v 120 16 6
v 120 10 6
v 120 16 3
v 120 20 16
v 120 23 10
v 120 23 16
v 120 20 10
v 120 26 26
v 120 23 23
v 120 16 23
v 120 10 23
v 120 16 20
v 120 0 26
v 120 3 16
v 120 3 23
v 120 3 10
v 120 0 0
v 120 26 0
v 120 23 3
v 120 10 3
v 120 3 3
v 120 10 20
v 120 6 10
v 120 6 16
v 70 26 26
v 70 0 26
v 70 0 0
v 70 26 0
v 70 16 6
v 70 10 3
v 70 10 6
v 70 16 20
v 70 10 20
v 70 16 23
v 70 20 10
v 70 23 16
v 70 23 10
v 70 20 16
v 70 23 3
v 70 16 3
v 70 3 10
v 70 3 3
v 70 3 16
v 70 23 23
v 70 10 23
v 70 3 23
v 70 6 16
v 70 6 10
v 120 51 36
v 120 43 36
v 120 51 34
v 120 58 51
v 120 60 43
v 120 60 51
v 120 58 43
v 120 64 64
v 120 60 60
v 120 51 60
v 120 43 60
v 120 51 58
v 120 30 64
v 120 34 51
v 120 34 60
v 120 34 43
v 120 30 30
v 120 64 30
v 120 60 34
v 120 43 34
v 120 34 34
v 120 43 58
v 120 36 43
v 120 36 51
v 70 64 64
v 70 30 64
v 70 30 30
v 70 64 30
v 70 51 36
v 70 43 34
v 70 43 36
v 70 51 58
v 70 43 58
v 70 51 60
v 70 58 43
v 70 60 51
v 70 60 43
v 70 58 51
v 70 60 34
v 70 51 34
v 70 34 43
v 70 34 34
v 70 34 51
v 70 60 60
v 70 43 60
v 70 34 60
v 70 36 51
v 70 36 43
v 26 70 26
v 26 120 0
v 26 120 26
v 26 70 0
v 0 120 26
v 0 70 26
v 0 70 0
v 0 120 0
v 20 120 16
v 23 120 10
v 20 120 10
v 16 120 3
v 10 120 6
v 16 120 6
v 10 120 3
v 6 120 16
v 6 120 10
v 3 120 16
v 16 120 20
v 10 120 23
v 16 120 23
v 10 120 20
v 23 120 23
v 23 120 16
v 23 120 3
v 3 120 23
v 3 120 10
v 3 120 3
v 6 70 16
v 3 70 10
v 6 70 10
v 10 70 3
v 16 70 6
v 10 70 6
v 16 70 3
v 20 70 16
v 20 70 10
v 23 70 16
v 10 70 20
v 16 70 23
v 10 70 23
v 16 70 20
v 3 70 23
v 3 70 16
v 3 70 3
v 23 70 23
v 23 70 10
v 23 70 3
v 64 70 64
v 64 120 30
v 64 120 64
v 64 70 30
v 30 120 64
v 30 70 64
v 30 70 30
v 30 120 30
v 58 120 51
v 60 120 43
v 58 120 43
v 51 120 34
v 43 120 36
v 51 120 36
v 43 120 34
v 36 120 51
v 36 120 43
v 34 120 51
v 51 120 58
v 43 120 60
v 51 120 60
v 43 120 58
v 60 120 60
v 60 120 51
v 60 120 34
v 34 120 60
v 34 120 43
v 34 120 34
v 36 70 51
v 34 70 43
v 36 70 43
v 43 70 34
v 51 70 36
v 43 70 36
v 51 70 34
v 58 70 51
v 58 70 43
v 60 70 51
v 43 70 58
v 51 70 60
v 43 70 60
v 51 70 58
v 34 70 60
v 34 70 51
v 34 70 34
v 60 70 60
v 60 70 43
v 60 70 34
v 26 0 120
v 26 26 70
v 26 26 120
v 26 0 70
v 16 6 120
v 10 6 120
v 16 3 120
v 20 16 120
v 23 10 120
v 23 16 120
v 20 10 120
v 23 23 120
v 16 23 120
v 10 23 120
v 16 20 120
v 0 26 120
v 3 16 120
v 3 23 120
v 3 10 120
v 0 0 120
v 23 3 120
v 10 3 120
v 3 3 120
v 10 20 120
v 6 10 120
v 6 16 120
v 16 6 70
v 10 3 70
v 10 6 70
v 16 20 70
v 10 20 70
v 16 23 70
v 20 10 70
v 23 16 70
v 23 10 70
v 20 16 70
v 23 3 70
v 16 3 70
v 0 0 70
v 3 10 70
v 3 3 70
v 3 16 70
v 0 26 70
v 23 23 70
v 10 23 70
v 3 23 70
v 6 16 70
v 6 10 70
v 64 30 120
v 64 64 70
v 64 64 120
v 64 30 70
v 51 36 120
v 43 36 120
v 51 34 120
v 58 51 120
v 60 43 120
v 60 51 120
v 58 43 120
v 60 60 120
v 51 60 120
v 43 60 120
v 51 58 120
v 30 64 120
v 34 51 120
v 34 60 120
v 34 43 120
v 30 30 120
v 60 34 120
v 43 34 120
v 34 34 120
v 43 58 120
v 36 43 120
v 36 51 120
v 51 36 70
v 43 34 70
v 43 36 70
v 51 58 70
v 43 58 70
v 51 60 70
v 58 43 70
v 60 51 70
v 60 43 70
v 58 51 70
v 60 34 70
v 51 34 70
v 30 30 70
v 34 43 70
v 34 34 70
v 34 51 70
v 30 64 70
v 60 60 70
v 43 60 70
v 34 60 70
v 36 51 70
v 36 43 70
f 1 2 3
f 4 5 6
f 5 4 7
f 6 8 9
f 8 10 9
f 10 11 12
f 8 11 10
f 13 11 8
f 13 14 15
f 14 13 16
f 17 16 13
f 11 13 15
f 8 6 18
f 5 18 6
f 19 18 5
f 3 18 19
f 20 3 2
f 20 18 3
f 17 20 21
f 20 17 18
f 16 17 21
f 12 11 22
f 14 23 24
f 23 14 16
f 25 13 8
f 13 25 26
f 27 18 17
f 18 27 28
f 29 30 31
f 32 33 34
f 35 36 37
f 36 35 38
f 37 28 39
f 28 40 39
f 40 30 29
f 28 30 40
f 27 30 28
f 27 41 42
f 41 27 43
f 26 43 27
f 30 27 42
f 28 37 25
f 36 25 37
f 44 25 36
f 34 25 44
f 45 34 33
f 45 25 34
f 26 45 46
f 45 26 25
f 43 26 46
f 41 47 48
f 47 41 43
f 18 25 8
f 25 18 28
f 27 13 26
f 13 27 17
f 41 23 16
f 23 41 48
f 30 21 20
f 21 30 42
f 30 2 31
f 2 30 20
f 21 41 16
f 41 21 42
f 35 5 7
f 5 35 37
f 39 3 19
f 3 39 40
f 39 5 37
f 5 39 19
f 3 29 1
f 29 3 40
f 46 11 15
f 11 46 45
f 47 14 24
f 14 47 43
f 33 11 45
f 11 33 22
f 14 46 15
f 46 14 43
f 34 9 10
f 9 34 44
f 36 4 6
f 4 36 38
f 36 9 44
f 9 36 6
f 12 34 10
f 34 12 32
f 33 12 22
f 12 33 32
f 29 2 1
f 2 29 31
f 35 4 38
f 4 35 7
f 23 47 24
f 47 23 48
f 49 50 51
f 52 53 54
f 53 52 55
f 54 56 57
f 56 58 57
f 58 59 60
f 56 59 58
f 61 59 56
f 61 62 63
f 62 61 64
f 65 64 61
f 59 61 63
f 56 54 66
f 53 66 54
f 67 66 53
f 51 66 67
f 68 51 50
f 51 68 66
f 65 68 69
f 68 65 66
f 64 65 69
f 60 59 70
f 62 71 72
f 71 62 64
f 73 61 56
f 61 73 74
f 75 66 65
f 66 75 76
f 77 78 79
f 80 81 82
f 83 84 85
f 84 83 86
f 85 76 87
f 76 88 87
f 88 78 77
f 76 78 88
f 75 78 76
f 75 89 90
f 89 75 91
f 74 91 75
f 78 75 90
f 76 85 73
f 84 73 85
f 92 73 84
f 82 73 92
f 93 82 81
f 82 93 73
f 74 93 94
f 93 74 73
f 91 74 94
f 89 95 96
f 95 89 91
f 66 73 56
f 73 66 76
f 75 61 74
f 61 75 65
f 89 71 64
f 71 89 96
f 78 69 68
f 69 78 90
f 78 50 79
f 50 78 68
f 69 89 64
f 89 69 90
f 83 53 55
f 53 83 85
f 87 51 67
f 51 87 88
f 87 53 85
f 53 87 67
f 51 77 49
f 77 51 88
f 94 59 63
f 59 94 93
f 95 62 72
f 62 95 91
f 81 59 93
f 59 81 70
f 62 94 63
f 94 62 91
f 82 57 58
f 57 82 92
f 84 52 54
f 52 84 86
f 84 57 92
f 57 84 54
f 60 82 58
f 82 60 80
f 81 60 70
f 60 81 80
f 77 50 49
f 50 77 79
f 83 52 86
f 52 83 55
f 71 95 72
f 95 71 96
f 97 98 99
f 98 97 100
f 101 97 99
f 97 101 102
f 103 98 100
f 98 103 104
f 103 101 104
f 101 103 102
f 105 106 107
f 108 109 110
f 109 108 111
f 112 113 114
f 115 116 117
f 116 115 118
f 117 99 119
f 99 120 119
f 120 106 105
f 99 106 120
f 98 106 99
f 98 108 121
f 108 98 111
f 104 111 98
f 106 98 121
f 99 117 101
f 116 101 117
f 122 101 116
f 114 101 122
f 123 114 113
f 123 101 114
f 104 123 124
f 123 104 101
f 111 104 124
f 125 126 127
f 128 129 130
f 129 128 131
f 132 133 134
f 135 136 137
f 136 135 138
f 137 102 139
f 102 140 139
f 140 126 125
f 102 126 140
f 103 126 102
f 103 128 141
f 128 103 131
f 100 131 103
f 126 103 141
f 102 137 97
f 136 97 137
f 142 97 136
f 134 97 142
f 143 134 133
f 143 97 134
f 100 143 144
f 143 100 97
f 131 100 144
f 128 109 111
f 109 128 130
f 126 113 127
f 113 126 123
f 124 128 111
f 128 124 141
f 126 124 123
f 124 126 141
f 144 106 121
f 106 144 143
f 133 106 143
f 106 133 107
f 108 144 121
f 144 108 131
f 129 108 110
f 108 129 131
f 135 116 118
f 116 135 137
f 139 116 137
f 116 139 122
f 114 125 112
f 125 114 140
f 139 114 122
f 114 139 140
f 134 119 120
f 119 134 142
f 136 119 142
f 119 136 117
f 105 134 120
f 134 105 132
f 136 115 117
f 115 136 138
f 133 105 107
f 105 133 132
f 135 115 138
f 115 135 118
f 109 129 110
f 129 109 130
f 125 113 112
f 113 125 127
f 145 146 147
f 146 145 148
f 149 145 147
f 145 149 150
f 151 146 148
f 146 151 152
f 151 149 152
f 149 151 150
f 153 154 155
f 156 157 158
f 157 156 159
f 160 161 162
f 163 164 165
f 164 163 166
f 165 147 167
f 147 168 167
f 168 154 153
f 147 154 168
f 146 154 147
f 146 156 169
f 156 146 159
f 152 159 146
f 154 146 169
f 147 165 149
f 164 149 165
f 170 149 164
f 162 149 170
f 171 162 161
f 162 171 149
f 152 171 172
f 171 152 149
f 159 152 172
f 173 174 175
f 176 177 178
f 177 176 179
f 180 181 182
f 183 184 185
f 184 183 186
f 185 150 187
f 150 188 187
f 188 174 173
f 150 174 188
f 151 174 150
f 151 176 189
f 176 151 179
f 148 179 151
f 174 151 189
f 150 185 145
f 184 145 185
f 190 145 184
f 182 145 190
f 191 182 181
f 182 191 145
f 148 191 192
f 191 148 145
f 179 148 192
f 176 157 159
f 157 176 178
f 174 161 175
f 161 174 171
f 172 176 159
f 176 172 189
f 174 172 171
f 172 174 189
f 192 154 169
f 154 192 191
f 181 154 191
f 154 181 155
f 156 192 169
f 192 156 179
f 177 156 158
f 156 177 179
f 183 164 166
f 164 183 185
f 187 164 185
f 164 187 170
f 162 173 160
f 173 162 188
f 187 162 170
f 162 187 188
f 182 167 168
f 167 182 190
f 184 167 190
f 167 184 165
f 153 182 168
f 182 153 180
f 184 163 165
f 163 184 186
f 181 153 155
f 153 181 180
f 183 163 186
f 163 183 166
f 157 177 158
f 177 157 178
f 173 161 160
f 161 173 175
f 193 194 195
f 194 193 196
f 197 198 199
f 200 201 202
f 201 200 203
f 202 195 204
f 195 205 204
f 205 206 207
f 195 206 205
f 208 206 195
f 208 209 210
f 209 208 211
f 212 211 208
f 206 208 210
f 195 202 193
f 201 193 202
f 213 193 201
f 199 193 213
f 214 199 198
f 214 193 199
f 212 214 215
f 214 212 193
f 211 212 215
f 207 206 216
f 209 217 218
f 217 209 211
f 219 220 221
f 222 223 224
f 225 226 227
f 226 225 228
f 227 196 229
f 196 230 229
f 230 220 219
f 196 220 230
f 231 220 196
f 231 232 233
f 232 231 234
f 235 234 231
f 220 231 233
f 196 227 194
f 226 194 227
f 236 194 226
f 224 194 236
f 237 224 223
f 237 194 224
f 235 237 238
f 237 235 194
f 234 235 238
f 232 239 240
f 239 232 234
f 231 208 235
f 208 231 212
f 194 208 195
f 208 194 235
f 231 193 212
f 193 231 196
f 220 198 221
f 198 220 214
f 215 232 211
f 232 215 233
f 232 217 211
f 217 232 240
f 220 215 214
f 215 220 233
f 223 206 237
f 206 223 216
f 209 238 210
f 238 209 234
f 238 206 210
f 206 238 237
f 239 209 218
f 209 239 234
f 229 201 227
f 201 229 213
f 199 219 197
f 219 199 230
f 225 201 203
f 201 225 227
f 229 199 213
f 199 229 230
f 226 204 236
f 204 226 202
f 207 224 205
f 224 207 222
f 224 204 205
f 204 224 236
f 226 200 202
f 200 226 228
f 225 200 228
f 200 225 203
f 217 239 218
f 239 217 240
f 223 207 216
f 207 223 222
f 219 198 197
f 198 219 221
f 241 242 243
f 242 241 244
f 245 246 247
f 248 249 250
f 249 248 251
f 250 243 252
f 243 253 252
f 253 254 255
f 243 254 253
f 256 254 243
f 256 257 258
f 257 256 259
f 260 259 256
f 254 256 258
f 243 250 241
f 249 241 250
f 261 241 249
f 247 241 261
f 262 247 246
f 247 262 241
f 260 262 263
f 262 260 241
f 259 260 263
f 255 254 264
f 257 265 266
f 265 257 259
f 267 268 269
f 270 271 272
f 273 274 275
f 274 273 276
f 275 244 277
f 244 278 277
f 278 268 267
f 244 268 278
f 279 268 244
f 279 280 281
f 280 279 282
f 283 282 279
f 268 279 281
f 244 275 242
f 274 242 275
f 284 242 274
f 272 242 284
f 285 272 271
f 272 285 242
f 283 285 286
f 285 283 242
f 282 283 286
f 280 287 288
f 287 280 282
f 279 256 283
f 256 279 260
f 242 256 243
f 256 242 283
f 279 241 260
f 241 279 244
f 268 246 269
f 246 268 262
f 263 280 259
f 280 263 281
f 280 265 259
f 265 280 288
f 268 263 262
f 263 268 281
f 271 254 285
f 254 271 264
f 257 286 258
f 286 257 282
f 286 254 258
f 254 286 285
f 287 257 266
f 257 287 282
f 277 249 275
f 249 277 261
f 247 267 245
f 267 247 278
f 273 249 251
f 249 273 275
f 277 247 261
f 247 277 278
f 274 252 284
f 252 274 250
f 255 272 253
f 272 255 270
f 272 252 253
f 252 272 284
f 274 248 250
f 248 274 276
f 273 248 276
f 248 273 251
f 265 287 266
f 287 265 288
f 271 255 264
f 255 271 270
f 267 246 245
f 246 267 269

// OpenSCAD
// file: modules_coin_0_1.scad
module tube_profile_X(x, y, z, longueur, epaisseur = 3, epaisseur_bloc = 3, largeur_bloc = 6, largeur_profile = 20)
{
    ecart = (largeur_profile - largeur_bloc)/2;
    
    difference()
    {
        translate([x,y,z])
        cube([longueur, largeur_profile+2*epaisseur, largeur_profile+2*epaisseur]);
        
        translate([x-1,y+epaisseur,z+epaisseur])
        #cube([longueur+2,ecart,ecart]);
        
        translate([x-1,y+epaisseur+ecart+largeur_bloc,z+epaisseur])
        #cube([longueur+2,ecart,ecart]);
        
        translate([x-1,y+epaisseur,z+epaisseur+ecart+largeur_bloc])
        #cube([longueur+2,ecart,ecart]);
        
        translate([x-1,y+epaisseur+ecart+largeur_bloc,z+epaisseur+ecart+largeur_bloc])
        #cube([longueur+2,ecart,ecart]);
        
        translate([x-1,y+epaisseur+epaisseur_bloc,z+epaisseur+epaisseur_bloc])
        #cube([longueur+2,largeur_profile-2*epaisseur_bloc,largeur_profile-2*epaisseur_bloc]);
    }
}

module tube_profile_Y(x, y, z, longueur, epaisseur = 3, epaisseur_bloc = 3, largeur_bloc = 6, largeur_profile = 20)
{
    ecart = (largeur_profile - largeur_bloc)/2;
    
    difference()
    {
        translate([x,y,z])
        cube([largeur_profile+2*epaisseur, longueur, largeur_profile+2*epaisseur]);
        
        translate([x+epaisseur,y-1,z+epaisseur])
        #cube([ecart,longueur+2,ecart]);
        
        translate([x+epaisseur+ecart+largeur_bloc,y-1,z+epaisseur])
        #cube([ecart,longueur+2,ecart]);
        
        translate([x+epaisseur,y-1,z+epaisseur+ecart+largeur_bloc])
        #cube([ecart,longueur+2,ecart]);
        
        translate([x+epaisseur+ecart+largeur_bloc,y-1,z+epaisseur+ecart+largeur_bloc])
        #cube([ecart,longueur+2,ecart]);
        
        translate([x+epaisseur+epaisseur_bloc,y-1,z+epaisseur+epaisseur_bloc])
        #cube([largeur_profile-2*epaisseur_bloc,longueur+2,largeur_profile-2*epaisseur_bloc]);
    }
}

module tube_profile_Z(x, y, z, longueur, epaisseur = 3, epaisseur_bloc = 3, largeur_bloc = 6, largeur_profile = 20)
{
    ecart = (largeur_profile - largeur_bloc)/2;
    
    difference()
    {
        translate([x,y,z])
        cube([largeur_profile+2*epaisseur, largeur_profile+2*epaisseur, longueur]);
        
        translate([x+epaisseur,y+epaisseur,z-1])
        #cube([ecart,ecart,longueur+2]);
        
        translate([x+epaisseur,y+epaisseur+ecart+largeur_bloc,z-1])
        #cube([ecart,ecart,longueur+2]);
        
        translate([x+epaisseur+ecart+largeur_bloc,y+epaisseur,z-1])
        #cube([ecart,ecart,longueur+2]);
        
        translate([x+epaisseur+ecart+largeur_bloc,y+epaisseur+ecart+largeur_bloc,z-1])
        #cube([ecart,ecart,longueur+2]);
        
        translate([x+epaisseur+epaisseur_bloc,y+epaisseur+epaisseur_bloc,z-1])
        #cube([largeur_profile-2*epaisseur_bloc,largeur_profile-2*epaisseur_bloc,longueur+2]);
    }
}
// main file
include <modules_coin_0_1.scad>

tube_profile_X(70,0,0,50);
tube_profile_X(x=70,y=30,z=30,longueur=50,epaisseur=4,epaisseur_bloc=2,largeur_bloc=8,largeur_profile=26);

tube_profile_Y(0,70,0,50);
tube_profile_Y(x=30,y=70,z=30,longueur=50,epaisseur=4,epaisseur_bloc=2,largeur_bloc=8,largeur_profile=26);

tube_profile_Z(0,0,70,50);
tube_profile_Z(x=30,y=30,z=70,longueur=50,epaisseur=4,epaisseur_bloc=2,largeur_bloc=8,largeur_profile=26);
